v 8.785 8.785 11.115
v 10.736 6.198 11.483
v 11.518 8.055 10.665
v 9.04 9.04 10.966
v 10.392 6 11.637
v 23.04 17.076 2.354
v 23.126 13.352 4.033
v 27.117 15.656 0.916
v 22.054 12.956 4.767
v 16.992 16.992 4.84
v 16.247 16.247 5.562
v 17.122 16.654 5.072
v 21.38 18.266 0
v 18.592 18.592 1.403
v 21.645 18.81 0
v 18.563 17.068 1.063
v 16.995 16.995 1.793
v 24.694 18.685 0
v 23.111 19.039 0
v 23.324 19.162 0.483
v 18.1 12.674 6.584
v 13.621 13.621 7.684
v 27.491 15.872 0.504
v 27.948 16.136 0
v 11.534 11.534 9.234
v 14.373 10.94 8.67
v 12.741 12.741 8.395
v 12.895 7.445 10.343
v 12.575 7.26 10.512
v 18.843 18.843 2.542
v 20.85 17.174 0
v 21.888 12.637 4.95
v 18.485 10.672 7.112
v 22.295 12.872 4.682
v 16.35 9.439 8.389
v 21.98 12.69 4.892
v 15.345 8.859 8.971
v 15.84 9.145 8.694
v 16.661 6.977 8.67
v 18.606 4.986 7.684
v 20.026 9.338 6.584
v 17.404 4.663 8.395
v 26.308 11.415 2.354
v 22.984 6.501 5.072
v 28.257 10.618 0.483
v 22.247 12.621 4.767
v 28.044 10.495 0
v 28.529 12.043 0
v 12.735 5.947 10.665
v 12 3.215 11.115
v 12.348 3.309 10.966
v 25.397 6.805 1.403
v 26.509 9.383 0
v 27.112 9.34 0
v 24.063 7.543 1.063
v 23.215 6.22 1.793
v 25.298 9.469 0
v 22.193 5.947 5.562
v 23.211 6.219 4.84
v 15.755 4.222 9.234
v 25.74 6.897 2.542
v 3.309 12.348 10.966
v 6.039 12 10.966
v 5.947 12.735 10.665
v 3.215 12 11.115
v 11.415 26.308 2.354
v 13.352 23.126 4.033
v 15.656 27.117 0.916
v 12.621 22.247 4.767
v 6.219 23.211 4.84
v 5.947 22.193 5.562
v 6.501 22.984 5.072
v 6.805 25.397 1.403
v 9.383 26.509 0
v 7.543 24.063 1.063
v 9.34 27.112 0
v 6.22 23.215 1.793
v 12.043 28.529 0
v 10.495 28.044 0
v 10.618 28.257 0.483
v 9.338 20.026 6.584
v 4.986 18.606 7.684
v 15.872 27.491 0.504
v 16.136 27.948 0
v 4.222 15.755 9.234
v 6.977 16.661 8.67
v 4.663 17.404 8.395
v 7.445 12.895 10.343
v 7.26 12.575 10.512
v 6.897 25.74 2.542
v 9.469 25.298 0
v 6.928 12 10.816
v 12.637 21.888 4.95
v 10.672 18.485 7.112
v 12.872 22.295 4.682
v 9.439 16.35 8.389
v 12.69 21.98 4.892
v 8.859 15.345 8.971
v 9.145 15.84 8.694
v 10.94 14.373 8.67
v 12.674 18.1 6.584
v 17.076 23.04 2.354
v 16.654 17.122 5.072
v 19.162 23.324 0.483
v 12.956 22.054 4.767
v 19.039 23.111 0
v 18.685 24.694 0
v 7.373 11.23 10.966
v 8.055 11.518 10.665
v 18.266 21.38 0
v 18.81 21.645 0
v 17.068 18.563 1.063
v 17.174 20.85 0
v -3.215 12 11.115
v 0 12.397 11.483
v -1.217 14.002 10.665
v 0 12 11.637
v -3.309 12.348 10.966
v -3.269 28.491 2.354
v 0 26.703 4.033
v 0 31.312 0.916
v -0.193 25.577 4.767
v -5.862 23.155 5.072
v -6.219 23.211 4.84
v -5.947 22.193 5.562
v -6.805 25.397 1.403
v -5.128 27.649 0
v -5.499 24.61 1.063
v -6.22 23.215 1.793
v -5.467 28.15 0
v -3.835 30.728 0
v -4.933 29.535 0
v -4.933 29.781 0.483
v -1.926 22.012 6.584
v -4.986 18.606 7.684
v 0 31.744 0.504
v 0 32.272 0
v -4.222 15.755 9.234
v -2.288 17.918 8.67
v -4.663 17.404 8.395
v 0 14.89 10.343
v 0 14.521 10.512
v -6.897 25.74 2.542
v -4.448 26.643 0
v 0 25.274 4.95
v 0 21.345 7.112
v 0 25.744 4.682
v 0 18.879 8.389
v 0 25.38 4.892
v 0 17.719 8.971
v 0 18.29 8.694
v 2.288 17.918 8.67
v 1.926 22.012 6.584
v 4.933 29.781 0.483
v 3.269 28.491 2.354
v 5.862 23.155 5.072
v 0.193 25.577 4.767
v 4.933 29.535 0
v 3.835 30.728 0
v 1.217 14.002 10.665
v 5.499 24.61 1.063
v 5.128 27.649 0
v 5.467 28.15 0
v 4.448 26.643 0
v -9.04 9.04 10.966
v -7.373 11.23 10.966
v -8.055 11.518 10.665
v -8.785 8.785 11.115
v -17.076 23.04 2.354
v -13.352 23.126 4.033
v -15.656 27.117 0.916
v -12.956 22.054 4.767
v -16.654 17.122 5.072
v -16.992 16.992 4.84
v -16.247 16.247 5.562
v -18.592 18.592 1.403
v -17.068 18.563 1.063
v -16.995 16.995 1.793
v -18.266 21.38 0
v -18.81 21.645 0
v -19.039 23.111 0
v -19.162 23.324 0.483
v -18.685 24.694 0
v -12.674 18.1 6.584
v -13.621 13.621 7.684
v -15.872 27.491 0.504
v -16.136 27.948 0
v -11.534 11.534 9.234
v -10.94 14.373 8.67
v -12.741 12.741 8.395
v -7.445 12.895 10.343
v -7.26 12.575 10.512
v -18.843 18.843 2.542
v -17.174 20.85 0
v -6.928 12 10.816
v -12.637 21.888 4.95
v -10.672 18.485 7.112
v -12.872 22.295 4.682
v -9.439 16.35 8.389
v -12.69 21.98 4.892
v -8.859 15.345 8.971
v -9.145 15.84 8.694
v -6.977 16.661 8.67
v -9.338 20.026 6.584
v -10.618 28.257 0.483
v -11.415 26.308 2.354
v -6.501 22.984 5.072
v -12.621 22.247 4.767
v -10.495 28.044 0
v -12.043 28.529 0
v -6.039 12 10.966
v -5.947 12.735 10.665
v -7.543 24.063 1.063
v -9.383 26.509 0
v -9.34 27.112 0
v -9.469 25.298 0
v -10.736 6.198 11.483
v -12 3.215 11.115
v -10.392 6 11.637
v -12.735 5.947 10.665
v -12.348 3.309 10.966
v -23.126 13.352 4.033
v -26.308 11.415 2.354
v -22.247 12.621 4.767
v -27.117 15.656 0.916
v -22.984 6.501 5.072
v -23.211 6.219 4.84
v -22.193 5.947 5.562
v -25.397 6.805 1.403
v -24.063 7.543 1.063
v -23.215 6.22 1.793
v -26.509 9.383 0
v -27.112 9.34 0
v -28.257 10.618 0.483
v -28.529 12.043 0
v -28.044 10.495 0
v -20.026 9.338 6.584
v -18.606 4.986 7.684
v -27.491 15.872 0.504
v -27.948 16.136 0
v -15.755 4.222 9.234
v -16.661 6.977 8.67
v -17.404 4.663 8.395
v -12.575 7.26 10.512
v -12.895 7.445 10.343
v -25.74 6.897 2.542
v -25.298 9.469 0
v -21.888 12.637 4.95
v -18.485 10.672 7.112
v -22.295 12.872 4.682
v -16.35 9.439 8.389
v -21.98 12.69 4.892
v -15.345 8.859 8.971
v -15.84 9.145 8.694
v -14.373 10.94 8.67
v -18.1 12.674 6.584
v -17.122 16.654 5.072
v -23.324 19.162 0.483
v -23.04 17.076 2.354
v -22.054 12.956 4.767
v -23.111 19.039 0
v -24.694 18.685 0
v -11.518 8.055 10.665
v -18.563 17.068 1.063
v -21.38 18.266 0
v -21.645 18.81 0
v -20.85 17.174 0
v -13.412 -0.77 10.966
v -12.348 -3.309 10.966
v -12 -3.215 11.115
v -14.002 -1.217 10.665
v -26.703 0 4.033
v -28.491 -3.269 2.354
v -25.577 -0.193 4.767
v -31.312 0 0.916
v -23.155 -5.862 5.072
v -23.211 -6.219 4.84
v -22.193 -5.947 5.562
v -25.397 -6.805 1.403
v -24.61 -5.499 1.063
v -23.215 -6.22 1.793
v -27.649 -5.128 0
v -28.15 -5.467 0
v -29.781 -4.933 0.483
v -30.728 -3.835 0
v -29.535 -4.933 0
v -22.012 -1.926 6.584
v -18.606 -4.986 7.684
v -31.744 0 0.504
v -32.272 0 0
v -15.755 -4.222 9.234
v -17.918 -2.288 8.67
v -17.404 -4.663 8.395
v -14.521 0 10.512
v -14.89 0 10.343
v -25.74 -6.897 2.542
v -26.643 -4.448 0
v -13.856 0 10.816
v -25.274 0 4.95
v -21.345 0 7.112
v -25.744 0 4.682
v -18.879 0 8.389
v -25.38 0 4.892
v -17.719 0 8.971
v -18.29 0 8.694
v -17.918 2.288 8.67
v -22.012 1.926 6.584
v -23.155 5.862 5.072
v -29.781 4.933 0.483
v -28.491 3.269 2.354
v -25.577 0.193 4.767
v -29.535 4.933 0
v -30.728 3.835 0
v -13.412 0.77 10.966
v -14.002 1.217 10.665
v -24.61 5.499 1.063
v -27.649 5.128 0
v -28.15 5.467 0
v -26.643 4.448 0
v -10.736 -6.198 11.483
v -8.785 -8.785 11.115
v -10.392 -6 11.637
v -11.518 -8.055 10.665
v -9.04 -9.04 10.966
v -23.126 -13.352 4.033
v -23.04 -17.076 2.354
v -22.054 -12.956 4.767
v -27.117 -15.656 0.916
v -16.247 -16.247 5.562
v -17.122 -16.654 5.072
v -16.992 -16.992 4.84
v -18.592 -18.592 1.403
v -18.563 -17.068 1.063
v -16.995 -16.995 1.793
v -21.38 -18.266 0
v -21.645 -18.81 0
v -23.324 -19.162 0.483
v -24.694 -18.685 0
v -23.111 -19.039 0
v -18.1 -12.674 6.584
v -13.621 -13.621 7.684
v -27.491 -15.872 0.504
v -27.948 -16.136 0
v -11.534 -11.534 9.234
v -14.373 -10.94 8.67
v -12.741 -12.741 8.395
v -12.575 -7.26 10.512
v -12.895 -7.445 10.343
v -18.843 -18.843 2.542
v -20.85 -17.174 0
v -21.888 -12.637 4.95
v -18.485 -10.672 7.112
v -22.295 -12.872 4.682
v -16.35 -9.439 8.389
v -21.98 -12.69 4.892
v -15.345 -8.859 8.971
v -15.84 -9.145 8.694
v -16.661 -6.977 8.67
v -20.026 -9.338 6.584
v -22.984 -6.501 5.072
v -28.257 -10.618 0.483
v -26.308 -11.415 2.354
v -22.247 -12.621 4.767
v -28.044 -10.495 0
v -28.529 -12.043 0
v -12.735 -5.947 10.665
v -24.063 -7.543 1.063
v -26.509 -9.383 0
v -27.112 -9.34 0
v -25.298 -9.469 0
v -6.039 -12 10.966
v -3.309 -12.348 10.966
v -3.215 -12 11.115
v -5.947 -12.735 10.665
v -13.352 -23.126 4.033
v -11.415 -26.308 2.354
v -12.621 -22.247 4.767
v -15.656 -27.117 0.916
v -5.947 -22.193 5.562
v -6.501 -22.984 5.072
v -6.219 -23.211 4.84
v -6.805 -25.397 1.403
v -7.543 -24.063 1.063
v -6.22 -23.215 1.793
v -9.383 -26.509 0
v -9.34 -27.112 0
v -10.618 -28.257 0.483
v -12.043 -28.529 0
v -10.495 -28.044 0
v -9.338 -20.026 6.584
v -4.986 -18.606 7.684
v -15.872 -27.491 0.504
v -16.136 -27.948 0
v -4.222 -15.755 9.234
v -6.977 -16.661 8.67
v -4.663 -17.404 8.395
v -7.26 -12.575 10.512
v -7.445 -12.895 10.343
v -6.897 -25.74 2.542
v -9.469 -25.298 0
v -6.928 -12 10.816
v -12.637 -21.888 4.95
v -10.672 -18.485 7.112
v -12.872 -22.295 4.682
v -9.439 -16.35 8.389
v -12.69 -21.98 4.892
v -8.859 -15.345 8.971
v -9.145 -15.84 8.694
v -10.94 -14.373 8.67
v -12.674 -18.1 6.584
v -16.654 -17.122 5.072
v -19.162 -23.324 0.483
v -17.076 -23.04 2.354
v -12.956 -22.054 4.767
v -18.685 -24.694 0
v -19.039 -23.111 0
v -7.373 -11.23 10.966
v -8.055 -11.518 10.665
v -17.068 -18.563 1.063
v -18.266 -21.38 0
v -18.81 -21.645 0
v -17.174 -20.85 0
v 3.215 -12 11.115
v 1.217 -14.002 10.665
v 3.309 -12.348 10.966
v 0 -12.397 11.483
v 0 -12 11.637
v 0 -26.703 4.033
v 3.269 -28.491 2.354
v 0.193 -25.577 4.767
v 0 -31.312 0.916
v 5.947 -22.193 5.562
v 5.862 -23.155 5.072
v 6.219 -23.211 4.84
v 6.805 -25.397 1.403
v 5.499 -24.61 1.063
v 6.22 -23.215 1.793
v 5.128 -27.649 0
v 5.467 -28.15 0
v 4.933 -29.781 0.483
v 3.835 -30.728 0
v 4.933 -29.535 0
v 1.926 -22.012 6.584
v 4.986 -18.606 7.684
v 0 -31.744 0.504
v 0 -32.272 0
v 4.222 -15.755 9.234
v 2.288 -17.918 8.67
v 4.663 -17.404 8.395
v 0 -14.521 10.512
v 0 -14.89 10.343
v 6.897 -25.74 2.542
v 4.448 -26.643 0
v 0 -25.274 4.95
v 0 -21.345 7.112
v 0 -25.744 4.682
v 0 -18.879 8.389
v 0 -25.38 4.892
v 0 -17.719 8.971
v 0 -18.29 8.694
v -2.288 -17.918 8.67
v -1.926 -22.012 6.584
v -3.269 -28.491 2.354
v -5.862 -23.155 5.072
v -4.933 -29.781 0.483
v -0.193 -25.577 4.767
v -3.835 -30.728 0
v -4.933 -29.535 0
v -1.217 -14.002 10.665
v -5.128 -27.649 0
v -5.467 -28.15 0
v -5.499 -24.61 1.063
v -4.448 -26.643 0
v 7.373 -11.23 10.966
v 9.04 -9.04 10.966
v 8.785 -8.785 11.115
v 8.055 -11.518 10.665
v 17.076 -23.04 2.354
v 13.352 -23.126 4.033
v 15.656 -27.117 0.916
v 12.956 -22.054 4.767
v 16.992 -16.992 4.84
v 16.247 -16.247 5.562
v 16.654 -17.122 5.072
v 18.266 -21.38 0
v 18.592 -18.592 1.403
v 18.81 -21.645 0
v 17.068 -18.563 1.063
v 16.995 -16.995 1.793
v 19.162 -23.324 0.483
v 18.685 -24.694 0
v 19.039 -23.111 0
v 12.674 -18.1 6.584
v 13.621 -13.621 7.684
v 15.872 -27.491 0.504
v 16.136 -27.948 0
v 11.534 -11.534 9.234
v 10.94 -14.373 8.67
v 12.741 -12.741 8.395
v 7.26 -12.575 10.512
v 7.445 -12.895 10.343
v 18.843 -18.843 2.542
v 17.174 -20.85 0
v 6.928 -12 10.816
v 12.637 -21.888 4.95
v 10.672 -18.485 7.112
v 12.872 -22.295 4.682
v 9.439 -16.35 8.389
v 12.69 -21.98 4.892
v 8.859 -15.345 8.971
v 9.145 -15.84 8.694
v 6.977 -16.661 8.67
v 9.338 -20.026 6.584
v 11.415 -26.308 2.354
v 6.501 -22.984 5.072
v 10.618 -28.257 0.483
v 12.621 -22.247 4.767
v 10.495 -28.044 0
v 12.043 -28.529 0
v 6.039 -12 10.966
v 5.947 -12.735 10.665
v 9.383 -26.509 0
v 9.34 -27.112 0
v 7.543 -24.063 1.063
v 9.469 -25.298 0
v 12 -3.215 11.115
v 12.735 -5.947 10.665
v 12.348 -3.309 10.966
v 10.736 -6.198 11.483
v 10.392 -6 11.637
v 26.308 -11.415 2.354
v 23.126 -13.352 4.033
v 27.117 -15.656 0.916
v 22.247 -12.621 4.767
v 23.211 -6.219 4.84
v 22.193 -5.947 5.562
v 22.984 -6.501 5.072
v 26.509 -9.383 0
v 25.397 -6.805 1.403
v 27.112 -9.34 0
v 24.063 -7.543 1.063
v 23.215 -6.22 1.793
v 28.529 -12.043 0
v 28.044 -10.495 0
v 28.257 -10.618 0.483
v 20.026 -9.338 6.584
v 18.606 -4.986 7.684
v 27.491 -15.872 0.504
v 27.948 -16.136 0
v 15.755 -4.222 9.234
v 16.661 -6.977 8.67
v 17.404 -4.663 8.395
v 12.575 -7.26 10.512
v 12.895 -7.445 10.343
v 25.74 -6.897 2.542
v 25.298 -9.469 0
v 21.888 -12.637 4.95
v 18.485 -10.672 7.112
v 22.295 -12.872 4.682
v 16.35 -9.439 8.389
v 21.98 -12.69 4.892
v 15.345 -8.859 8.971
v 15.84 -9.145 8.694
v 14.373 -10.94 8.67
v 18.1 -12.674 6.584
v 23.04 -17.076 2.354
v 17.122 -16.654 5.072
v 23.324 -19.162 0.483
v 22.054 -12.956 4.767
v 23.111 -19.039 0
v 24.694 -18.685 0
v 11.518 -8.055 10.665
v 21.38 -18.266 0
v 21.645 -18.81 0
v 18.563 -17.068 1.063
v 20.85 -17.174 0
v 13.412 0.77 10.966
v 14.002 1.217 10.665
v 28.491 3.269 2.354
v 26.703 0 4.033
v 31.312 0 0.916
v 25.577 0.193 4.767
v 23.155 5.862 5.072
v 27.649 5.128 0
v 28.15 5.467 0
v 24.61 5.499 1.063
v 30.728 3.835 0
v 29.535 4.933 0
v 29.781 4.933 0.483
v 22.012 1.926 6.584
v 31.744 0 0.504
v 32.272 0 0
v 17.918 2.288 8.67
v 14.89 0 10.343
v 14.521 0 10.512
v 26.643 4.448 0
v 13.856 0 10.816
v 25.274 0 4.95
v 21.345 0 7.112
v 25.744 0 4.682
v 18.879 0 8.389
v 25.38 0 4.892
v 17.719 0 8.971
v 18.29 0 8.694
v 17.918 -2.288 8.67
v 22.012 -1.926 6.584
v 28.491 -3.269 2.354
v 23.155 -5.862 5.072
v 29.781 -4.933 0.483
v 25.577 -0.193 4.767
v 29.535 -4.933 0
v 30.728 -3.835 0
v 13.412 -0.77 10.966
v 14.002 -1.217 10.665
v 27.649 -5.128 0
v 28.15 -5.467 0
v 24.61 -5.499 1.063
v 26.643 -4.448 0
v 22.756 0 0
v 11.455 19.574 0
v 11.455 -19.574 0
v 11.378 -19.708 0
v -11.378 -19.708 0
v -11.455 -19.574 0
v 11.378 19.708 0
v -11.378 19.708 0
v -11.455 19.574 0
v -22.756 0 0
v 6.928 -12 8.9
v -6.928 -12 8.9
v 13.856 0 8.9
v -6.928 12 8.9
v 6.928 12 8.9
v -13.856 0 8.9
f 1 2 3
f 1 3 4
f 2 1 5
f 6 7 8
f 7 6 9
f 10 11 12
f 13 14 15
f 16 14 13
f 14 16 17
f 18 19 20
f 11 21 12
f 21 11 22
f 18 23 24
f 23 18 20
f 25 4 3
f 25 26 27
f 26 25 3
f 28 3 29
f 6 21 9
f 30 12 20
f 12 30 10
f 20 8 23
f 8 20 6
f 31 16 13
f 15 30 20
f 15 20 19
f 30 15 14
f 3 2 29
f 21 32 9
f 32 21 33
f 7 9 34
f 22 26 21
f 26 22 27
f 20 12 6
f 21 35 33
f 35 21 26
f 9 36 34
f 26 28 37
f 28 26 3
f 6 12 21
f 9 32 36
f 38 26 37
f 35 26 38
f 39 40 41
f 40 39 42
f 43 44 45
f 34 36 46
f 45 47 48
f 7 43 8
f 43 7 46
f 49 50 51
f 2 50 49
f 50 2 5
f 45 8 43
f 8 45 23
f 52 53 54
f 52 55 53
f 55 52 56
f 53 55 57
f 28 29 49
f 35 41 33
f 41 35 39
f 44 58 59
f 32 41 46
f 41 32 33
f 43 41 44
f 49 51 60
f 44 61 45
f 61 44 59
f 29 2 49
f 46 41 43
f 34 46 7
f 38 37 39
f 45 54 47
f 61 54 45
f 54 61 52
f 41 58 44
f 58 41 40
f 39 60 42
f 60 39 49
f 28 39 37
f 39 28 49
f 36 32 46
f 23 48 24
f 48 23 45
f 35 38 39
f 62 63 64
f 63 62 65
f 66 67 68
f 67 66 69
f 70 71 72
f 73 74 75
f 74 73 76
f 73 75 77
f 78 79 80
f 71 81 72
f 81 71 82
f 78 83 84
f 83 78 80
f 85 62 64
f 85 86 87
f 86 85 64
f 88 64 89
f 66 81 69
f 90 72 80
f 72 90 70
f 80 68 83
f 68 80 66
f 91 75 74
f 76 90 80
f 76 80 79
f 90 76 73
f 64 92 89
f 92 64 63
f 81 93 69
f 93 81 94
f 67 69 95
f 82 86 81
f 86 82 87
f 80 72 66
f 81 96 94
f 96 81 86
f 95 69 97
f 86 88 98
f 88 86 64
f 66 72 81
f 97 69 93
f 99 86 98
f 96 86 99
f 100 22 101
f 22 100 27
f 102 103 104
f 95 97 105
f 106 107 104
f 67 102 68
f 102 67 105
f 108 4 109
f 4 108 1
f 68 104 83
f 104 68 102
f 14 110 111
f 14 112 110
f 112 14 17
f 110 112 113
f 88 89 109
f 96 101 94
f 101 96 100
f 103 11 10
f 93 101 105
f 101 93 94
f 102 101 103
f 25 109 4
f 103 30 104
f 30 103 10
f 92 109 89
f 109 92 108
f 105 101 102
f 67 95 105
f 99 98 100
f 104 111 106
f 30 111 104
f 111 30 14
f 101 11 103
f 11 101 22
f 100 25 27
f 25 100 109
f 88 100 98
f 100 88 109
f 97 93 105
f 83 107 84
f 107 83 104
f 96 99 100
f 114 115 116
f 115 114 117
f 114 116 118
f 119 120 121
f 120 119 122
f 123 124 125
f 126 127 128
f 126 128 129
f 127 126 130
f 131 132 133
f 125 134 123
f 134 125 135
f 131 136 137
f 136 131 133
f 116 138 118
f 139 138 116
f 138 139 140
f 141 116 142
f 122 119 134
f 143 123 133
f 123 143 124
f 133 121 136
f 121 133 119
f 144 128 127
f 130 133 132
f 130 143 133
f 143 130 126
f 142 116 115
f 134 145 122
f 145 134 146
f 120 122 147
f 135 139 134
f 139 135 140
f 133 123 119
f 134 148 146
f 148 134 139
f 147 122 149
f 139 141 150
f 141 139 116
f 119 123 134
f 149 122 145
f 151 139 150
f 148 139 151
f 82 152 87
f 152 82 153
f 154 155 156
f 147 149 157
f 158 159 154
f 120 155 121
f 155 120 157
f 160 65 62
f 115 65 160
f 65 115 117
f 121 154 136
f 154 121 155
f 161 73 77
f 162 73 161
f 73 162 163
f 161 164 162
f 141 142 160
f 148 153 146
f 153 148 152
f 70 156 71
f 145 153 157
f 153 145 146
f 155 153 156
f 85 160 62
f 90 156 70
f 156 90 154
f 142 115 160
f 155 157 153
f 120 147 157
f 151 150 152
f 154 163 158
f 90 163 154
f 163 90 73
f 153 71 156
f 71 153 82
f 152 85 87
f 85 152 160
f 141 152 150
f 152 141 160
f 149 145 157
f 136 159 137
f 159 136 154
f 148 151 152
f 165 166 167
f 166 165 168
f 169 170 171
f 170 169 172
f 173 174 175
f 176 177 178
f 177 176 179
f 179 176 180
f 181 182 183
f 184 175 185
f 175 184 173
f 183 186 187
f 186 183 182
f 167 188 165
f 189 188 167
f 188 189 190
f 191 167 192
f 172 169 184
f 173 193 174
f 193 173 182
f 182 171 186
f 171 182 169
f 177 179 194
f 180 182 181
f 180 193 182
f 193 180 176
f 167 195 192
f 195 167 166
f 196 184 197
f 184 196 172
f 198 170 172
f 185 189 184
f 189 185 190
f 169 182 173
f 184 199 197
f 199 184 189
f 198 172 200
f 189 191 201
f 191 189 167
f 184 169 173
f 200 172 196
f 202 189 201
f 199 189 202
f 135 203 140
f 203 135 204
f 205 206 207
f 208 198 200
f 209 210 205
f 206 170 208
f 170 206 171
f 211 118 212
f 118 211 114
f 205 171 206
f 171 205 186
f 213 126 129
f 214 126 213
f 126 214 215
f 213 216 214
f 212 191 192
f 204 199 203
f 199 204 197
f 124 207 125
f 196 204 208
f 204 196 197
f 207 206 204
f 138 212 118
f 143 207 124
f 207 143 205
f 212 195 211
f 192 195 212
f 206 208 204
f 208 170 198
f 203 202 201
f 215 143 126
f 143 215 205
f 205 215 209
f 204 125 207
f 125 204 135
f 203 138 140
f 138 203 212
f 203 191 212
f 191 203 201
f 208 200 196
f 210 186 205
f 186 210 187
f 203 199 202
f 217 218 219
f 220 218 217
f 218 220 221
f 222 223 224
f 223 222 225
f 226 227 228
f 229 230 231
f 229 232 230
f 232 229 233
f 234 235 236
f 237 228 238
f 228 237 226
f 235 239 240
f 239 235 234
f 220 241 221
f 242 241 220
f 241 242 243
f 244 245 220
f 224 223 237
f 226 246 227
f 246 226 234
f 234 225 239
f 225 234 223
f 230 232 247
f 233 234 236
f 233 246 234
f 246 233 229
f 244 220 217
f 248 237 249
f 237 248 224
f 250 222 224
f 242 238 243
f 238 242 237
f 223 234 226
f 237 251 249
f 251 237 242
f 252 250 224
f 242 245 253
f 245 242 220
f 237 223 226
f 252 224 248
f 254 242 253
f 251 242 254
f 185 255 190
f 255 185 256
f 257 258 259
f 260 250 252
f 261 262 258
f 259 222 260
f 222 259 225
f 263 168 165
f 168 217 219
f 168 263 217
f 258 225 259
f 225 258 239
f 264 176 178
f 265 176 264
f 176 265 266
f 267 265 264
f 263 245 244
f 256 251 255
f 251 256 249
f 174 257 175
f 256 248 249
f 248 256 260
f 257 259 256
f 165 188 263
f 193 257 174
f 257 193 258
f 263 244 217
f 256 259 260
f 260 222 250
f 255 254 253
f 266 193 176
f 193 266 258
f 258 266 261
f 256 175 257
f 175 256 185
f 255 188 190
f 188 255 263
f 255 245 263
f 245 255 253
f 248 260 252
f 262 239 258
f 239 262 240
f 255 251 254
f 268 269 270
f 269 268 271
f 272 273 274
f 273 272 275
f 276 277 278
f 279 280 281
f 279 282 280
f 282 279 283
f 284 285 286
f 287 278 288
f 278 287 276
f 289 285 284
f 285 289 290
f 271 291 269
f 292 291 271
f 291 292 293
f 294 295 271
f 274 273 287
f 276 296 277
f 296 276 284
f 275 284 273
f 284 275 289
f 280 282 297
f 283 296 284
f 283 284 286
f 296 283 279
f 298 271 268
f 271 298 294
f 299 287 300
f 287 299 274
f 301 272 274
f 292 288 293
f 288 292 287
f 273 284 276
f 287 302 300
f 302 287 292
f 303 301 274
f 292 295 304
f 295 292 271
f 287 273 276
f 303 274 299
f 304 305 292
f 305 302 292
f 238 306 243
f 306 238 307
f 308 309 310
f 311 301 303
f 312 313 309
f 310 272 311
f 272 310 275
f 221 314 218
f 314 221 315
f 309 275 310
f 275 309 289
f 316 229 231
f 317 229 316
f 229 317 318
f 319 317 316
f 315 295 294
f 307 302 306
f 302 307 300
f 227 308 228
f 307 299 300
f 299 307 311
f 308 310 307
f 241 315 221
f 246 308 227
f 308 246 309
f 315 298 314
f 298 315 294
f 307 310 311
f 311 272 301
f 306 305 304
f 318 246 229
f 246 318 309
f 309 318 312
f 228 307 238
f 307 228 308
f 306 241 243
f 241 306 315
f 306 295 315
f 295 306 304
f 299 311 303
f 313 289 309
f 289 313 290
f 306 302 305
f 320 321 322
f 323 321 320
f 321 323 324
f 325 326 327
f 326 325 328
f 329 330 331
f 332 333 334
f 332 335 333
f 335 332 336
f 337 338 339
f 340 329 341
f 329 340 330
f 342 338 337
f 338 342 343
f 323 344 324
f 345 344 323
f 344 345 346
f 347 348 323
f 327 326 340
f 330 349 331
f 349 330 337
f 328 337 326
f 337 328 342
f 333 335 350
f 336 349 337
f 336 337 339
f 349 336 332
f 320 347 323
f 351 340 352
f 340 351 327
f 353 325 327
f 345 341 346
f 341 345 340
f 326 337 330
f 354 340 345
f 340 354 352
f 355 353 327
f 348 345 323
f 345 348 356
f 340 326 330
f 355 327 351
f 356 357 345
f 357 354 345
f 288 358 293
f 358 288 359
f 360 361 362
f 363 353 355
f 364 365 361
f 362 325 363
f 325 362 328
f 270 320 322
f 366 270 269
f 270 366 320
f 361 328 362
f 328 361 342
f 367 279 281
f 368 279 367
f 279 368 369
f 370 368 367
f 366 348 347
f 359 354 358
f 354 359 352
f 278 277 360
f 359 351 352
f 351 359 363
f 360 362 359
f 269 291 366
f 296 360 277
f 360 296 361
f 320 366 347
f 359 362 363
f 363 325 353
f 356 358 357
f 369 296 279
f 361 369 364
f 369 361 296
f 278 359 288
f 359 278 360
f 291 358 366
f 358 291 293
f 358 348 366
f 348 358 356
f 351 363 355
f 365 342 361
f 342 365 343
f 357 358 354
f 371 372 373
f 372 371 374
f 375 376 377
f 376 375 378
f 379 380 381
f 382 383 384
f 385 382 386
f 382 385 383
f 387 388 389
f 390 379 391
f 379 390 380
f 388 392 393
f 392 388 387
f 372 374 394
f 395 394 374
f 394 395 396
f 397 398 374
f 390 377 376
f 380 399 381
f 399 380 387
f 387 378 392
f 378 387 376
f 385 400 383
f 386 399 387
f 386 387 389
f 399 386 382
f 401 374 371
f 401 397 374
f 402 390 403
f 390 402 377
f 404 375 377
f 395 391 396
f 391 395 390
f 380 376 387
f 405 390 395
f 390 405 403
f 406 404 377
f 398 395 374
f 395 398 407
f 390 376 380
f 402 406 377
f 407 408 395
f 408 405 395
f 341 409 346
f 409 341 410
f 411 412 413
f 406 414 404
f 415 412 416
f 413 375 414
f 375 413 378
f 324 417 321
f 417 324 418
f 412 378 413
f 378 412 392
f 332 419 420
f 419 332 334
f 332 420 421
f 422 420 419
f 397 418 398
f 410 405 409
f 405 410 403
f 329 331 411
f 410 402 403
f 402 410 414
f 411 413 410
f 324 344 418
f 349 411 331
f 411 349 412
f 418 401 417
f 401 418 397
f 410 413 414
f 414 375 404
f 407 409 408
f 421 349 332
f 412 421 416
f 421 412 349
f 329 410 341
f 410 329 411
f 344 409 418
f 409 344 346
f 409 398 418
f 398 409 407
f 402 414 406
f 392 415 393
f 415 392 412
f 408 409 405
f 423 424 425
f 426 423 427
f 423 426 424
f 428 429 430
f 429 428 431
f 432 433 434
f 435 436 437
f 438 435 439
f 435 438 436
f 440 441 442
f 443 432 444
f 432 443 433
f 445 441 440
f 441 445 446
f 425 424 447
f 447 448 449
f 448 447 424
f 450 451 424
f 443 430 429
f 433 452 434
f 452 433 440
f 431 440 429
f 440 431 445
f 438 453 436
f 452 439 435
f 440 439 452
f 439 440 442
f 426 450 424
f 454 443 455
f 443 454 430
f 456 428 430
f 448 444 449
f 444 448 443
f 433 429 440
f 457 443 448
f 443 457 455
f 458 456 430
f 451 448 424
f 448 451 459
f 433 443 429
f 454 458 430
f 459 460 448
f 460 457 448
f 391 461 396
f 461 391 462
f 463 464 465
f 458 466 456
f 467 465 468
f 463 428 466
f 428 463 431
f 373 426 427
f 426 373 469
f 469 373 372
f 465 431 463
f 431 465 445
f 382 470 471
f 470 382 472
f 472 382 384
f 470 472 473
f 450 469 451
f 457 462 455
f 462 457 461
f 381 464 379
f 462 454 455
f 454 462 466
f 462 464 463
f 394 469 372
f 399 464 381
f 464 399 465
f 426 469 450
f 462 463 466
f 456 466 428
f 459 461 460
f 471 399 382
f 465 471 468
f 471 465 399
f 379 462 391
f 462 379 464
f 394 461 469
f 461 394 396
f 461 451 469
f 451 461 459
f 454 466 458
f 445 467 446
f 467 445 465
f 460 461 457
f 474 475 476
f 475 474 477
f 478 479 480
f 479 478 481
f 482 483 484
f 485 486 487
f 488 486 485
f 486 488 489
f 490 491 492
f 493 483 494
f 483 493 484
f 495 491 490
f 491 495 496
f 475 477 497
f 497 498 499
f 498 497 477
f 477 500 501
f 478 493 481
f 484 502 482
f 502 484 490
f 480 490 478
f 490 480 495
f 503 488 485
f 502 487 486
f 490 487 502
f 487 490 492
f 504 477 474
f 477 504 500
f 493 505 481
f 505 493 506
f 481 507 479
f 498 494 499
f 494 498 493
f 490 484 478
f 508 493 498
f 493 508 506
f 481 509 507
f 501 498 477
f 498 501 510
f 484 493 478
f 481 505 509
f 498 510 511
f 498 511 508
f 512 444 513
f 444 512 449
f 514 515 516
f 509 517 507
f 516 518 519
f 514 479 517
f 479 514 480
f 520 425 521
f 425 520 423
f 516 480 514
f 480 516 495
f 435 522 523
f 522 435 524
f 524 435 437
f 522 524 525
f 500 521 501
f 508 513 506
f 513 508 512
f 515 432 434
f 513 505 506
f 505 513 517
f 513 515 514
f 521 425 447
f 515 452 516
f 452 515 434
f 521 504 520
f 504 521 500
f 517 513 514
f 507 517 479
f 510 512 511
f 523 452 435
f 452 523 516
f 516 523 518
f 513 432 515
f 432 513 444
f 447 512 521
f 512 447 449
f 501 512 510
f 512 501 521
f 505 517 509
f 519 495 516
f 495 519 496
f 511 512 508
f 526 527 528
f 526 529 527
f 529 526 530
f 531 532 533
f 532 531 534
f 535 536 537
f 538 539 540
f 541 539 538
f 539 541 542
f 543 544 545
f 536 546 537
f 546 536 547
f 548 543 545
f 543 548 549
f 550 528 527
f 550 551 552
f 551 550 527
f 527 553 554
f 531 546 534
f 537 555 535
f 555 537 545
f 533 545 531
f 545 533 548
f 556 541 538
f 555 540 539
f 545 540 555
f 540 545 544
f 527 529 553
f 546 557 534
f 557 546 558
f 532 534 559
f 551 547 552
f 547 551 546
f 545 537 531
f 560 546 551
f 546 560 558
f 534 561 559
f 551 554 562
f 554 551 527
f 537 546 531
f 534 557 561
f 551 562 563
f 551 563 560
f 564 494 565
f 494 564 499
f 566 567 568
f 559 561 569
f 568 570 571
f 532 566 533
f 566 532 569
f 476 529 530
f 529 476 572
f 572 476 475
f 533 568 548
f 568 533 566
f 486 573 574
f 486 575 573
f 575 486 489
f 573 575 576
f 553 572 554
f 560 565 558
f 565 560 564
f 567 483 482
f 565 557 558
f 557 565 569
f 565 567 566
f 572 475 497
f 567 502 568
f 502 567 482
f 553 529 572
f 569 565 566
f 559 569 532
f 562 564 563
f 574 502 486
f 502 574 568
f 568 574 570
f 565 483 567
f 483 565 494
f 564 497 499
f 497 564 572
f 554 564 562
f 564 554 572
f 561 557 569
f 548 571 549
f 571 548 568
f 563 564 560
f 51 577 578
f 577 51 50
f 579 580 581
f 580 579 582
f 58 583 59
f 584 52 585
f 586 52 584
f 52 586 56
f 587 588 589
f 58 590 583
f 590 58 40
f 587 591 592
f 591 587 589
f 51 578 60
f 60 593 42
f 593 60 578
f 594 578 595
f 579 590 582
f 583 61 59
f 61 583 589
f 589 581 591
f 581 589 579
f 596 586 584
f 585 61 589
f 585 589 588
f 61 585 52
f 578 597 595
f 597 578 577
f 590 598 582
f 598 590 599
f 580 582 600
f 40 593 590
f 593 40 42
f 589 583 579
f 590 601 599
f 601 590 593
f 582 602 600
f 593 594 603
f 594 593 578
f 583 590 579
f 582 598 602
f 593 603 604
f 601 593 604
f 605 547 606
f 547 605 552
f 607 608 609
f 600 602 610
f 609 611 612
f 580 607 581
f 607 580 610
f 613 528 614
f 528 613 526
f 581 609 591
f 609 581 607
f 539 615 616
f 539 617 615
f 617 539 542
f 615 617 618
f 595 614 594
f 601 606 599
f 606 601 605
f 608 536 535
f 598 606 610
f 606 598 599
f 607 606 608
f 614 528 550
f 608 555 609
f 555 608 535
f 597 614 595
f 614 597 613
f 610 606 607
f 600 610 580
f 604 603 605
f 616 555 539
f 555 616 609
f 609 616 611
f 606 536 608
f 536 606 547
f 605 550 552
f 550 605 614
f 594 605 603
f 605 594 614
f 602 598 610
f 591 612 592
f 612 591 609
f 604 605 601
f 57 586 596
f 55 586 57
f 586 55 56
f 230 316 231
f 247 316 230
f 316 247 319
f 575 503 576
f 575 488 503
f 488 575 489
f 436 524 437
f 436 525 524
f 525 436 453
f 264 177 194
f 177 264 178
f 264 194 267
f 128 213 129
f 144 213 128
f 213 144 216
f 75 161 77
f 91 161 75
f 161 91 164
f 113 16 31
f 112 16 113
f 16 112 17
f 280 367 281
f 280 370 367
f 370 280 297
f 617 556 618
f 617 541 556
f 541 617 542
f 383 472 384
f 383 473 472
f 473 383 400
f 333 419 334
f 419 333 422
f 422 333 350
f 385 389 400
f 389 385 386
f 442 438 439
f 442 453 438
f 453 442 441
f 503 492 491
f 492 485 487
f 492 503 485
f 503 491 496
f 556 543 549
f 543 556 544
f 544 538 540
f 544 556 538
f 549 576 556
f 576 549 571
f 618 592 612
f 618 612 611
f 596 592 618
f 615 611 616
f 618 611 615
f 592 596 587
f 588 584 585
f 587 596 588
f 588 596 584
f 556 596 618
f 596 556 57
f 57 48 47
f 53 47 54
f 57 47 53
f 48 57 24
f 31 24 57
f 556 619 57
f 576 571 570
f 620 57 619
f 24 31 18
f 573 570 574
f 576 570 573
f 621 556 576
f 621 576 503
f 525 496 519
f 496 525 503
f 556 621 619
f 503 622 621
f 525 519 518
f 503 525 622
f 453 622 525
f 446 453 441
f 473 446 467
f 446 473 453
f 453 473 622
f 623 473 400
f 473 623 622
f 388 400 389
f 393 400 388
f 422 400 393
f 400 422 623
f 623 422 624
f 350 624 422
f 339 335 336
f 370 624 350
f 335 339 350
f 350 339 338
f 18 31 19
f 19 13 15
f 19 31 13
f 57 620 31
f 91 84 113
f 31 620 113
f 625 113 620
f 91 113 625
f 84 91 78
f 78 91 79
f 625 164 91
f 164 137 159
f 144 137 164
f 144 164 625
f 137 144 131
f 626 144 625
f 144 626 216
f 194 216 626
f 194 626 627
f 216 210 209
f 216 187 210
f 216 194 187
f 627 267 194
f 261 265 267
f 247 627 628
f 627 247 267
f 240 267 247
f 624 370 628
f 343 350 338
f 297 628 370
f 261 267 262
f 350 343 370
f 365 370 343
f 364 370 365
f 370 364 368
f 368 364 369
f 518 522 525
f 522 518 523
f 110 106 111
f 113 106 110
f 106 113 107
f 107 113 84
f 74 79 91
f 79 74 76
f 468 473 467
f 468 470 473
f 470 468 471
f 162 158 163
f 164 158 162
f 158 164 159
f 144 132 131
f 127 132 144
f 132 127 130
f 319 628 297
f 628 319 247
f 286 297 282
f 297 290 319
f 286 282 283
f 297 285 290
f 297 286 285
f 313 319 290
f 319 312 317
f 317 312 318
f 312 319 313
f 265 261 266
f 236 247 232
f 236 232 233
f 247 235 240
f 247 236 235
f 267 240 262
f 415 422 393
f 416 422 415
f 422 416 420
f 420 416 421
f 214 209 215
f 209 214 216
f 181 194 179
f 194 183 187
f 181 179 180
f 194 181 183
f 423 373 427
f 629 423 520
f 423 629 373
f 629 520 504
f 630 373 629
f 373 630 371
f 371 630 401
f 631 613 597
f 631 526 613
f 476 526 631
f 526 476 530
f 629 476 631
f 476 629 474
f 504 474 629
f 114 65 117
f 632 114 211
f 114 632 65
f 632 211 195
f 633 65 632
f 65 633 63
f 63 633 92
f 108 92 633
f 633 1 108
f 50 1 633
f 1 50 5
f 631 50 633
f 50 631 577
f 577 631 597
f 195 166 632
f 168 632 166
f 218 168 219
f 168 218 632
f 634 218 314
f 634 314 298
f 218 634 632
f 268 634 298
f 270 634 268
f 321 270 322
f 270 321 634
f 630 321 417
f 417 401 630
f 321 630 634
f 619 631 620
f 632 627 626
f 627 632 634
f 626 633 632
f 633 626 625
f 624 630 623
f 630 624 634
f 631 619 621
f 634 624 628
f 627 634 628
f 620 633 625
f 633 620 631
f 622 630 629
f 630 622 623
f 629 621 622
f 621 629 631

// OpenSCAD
// Rosette
// (c) 2013 Wouter Robers

HoleDiameter=24;
NumberOfSidesForHole=6; //[4:60]
NumberOfLeaves=12; //[3:30]
LeafLength=20;  //[10:40]
LeafWidth=15; //[2:20]
LeafThickness=3; //[1:10]
LeafPointyness=4; //[0:10]
HalfOrFull="Full"; //[Half,Full]
// Polygons
$fn=15; //[15:Rough,30:Medium,60:Fine]

difference(){
union(){
translate([0,0,-0.1]) cylinder(r1=28,r2=0,h=17,$fn=12);
translate([0,0,15]) for(i=[1:NumberOfLeaves]){
rotate([0,27,i*360/NumberOfLeaves])
intersection(){
scale([LeafLength,LeafWidth,LeafThickness]) translate([1,-LeafPointyness/10,0])sphere(1);
scale([LeafLength,LeafWidth,LeafThickness]) translate([1,LeafPointyness/10,0])sphere(1);
}
}

}
// Cutting floor
translate([0,0,-100]) cube(200,center=true);
//Cutting half
if(HalfOrFull=="Half"){
translate([0,-50,0]) cube(100,center=true);}
// Hexagonal hole
translate([0,0,-1]) cylinder(r=HoleDiameter/2/cos(180/NumberOfSidesForHole),h=70,$fn=NumberOfSidesForHole);
translate([0,0,-0.1]) cylinder(r1=12/(0.5*sqrt(3))+9,r2=HoleDiameter/2/sin(60),h=9,$fn=NumberOfSidesForHole);
}
